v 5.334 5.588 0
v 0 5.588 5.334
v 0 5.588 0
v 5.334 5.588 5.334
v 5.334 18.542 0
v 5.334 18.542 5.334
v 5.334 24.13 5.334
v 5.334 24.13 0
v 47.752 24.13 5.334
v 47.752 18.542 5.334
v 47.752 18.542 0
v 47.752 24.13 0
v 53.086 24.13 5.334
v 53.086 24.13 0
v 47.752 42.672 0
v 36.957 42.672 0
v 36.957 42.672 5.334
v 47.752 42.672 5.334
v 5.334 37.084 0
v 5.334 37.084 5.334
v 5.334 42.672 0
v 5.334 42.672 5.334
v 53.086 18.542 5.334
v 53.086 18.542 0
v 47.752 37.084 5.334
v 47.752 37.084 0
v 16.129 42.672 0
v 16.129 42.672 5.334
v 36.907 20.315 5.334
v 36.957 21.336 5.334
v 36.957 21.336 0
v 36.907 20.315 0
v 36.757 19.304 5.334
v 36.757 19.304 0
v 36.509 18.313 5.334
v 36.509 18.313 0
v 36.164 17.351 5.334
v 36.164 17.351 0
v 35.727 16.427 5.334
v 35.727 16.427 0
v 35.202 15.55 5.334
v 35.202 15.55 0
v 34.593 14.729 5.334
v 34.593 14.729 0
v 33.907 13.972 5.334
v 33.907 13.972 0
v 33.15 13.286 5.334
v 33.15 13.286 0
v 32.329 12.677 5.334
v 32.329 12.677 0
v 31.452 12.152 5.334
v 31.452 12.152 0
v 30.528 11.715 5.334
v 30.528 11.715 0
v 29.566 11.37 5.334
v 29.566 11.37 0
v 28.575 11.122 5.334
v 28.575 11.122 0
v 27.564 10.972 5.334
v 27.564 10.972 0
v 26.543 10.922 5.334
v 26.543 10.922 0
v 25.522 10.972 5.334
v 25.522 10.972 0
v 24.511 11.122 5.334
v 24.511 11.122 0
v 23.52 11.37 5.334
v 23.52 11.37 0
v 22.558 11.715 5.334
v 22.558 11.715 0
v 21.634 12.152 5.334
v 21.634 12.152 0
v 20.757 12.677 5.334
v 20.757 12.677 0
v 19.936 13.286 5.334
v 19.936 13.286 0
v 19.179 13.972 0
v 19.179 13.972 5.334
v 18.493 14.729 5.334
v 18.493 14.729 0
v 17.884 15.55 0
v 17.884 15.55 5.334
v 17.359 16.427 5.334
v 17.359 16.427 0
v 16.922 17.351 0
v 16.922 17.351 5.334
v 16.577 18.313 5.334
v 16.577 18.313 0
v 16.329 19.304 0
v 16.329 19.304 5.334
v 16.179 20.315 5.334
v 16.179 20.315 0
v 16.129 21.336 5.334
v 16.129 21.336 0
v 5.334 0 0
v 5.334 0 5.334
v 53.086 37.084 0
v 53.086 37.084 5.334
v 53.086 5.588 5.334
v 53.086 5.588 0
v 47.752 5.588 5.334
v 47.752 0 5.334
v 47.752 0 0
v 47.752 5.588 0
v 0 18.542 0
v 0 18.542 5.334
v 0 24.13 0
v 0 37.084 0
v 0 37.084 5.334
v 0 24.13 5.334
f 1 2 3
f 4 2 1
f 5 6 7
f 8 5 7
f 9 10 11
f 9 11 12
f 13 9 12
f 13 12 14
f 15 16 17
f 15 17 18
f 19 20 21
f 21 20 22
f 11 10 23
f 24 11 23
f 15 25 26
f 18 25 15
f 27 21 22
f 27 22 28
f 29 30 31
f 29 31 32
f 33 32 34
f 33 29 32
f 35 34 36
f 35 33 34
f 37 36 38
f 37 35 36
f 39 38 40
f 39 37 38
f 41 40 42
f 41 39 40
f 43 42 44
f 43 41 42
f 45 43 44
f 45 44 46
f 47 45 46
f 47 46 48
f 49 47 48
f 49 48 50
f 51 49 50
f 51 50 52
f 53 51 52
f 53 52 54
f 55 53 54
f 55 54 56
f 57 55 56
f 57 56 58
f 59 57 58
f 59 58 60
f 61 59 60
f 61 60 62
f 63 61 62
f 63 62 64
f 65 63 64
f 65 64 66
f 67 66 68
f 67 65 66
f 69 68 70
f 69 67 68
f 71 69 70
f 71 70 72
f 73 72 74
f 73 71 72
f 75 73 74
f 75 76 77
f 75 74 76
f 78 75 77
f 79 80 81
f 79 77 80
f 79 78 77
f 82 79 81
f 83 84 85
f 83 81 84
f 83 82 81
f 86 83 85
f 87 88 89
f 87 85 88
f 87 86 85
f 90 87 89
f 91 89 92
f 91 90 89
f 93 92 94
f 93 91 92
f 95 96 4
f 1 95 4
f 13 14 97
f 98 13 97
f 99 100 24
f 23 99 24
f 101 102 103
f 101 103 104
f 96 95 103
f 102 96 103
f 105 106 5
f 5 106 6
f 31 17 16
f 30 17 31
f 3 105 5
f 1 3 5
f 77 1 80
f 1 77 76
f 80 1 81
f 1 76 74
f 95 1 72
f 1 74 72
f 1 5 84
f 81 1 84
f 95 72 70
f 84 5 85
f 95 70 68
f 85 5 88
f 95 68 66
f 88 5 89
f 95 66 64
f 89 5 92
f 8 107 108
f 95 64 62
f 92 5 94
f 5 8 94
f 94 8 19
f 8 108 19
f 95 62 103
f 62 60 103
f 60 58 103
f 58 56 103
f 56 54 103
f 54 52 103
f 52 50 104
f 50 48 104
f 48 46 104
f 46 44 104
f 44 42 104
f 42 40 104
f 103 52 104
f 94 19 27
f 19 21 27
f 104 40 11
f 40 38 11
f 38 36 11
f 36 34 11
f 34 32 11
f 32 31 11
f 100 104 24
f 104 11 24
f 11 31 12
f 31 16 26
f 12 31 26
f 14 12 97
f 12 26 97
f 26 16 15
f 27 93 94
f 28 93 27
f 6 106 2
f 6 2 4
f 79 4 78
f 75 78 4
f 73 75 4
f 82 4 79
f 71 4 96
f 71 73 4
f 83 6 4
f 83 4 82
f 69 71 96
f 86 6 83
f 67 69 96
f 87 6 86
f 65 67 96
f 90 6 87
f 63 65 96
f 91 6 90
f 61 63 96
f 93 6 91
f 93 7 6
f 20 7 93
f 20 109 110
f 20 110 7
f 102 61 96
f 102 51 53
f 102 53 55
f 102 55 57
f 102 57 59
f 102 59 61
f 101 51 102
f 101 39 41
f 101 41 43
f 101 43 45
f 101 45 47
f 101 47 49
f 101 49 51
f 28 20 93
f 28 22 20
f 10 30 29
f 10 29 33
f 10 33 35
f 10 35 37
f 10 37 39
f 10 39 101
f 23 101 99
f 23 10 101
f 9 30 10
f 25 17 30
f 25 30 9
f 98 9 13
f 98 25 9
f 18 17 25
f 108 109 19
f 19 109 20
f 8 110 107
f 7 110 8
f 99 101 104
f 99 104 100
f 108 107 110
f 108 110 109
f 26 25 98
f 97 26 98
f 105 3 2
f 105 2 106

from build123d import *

# Parameters (mm, degrees)
SKETCH1_W           = 53.086
SKETCH1_H           = 42.672
BOSS_EXTRUDE1_DEPTH = 5.334
SKETCH2_W           = 5.334
SKETCH2_H           = 5.588
CUT_EXTRUDE1_DEPTH  = 6.334
SKETCH3_W           = 5.334
SKETCH3_H           = 5.588
CUT_EXTRUDE2_DEPTH  = 6.334
SKETCH4_W           = 5.334
SKETCH4_H           = 5.588
CUT_EXTRUDE3_DEPTH  = 6.334
SKETCH5_W           = 5.334
SKETCH5_H           = 5.588
CUT_EXTRUDE4_DEPTH  = 6.334
SKETCH6_W           = 5.334
SKETCH6_H           = 5.588
CUT_EXTRUDE5_DEPTH  = 6.334
CUT_EXTRUDE6_DEPTH  = 6.334


with BuildPart() as part:
    # Sketch1 → Boss-Extrude1 (new body)
    with BuildSketch(Plane.XY):
        with Locations((26.543, 21.336)):
            Rectangle(SKETCH1_W, SKETCH1_H)
    extrude(amount=BOSS_EXTRUDE1_DEPTH)

    # Sketch2 → Cut-Extrude1 (cut, through all)
    with BuildSketch(Plane.XY.offset(5.334)):
        with Locations((2.667, 39.878)):
            Rectangle(SKETCH2_W, SKETCH2_H)
    extrude(amount=-CUT_EXTRUDE1_DEPTH, mode=Mode.SUBTRACT)

    # Sketch3 → Cut-Extrude2 (cut, through all)
    with BuildSketch(Plane.XY.offset(5.334)):
        with Locations((2.667, 21.336)):
            Rectangle(SKETCH3_W, SKETCH3_H)
    extrude(amount=-CUT_EXTRUDE2_DEPTH, mode=Mode.SUBTRACT)

    # Sketch4 → Cut-Extrude3 (cut, through all)
    with BuildSketch(Plane.XY.offset(5.334)):
        with Locations((2.667, 2.794)):
            Rectangle(SKETCH4_W, SKETCH4_H)
    extrude(amount=-CUT_EXTRUDE3_DEPTH, mode=Mode.SUBTRACT)

    # Sketch5 → Cut-Extrude4 (cut, through all)
    with BuildSketch(Plane.XY.offset(5.334)):
        with Locations((50.419, 39.878)):
            Rectangle(SKETCH5_W, SKETCH5_H)
    extrude(amount=-CUT_EXTRUDE4_DEPTH, mode=Mode.SUBTRACT)

    # Sketch6 → Cut-Extrude5 (cut, through all)
    with BuildSketch(Plane.XY.offset(5.334)):
        with Locations((50.419, 21.336)):
            Rectangle(SKETCH6_W, SKETCH6_H)
        with Locations((50.419, 2.794)):
            Rectangle(SKETCH6_W, SKETCH6_H)
    extrude(amount=-CUT_EXTRUDE5_DEPTH, mode=Mode.SUBTRACT)

    # Sketch11 → Cut-Extrude6 (cut, through all)
    with BuildSketch(Plane.XY.offset(5.334)):
        with BuildLine():
            Line((16.129, 21.336), (16.129, 42.672))
            Line((16.129, 42.672), (36.957, 42.672))
            Line((36.957, 42.672), (36.957, 21.336))
            ThreePointArc((36.957, 21.336), (26.543, 10.922), (16.129, 21.336))
        make_face()
    extrude(amount=-CUT_EXTRUDE6_DEPTH, mode=Mode.SUBTRACT)


solid = part.part
